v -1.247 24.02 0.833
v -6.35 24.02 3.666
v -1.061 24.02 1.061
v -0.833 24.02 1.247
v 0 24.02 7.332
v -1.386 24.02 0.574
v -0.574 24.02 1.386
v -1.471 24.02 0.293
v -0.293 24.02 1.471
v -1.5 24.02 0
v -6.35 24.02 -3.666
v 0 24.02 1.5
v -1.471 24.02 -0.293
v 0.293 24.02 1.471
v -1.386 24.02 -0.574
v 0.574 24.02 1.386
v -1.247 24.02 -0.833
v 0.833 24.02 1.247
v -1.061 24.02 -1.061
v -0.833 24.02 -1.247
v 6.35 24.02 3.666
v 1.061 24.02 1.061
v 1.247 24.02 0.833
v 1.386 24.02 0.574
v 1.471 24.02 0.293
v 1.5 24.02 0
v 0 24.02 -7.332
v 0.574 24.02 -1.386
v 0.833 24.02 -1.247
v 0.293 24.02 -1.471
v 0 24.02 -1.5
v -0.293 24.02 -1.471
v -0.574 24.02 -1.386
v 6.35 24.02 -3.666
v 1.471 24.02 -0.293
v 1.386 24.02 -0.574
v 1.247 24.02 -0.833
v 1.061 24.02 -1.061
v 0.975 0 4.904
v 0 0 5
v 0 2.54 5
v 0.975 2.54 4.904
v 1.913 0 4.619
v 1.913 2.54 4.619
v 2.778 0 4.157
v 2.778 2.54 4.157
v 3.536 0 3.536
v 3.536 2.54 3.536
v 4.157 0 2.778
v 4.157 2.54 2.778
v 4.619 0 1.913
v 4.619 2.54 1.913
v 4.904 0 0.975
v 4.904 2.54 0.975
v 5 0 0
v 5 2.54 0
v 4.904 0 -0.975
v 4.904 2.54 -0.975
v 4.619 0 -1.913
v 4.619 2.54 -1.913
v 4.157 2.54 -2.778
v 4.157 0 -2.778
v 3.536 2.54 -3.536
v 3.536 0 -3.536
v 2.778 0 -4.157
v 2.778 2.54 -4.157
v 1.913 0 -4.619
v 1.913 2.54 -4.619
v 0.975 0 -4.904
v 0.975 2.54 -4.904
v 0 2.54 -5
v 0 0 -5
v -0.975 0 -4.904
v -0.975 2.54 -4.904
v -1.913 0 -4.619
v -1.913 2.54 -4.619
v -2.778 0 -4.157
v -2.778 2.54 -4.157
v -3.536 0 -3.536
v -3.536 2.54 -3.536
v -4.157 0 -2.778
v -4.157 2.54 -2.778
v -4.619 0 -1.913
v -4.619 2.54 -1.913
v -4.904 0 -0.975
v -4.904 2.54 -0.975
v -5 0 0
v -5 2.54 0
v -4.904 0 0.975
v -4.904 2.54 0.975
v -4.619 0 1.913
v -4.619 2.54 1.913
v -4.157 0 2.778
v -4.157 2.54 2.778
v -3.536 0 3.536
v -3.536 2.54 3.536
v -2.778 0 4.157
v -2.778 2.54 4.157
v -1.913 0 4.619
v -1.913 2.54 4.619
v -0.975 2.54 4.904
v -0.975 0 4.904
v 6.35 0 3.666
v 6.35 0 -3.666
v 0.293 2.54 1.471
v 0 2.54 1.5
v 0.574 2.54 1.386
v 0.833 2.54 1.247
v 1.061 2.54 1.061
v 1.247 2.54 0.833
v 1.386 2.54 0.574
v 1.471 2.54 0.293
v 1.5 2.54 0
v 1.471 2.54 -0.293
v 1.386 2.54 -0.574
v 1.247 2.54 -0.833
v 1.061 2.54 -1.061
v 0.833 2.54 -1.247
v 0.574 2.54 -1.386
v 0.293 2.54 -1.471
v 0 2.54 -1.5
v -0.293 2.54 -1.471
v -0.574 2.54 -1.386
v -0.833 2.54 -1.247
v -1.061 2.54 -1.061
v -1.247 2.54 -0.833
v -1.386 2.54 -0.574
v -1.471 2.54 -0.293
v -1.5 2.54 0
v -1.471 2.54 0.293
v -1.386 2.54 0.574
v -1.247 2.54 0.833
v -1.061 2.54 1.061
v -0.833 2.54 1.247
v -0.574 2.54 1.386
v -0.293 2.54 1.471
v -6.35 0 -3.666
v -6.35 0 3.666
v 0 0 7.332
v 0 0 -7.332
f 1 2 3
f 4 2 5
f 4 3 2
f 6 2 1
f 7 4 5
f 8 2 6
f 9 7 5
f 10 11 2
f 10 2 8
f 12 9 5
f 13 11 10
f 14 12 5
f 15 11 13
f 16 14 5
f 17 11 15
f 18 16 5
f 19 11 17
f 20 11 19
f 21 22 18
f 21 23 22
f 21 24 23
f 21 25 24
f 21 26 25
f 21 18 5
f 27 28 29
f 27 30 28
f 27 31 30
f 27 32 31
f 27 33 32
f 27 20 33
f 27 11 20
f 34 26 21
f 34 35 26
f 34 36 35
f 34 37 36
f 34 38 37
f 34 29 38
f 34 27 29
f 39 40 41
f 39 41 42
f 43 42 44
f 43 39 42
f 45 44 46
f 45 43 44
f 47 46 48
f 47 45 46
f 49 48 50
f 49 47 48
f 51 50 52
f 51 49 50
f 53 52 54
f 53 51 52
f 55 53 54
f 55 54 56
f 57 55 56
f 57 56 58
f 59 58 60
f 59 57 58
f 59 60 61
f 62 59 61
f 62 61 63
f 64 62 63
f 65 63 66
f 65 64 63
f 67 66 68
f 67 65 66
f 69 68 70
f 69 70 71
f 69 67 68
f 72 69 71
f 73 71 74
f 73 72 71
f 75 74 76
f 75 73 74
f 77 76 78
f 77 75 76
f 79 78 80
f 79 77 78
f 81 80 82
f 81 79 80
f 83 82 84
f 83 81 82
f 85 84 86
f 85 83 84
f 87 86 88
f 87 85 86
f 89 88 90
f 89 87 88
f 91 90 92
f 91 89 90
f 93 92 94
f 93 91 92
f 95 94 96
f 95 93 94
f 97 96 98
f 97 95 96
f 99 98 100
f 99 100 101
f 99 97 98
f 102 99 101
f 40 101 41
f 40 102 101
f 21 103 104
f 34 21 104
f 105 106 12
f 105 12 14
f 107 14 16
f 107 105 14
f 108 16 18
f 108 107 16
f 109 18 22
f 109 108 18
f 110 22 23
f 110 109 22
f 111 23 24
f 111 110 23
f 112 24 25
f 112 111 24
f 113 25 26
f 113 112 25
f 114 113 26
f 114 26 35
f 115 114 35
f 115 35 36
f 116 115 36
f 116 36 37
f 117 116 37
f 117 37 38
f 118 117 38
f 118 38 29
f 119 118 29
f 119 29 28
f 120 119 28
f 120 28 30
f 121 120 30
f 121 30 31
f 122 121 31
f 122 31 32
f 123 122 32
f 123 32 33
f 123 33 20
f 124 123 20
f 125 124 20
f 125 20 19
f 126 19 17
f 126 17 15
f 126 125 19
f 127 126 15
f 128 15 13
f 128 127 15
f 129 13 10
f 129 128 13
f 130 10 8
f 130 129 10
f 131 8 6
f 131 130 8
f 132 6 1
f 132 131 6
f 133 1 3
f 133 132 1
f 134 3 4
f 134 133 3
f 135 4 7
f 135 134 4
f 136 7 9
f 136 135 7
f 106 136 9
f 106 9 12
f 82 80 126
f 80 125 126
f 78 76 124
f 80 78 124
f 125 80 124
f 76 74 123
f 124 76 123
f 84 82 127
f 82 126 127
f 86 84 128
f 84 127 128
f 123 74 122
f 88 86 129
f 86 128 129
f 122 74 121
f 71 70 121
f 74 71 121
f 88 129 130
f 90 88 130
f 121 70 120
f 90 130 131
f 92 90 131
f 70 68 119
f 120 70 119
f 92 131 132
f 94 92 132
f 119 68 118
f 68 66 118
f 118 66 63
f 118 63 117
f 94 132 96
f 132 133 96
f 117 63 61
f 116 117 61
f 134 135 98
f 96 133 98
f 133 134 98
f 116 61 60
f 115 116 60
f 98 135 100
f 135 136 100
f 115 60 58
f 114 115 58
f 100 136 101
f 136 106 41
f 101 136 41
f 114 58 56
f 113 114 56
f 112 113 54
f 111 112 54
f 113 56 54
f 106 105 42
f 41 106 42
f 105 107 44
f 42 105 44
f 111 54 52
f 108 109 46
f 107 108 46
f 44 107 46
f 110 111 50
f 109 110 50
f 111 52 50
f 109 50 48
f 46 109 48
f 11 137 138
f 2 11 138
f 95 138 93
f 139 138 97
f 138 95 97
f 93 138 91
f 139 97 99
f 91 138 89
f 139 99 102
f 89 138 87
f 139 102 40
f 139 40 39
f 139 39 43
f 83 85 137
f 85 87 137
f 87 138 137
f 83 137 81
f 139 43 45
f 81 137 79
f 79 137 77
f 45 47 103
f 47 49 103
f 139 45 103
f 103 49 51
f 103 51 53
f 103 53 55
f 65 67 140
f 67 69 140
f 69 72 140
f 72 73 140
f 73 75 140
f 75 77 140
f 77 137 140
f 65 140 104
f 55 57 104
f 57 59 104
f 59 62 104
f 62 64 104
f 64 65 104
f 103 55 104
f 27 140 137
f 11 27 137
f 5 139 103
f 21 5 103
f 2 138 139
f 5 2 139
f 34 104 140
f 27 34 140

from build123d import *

# Parameters (mm, degrees)
SKETCH1_R           = 1.5
BOSS_EXTRUDE1_DEPTH = 24.0204498
SKETCH2_R           = 5
CUT_EXTRUDE1_DEPTH  = 2.54


with BuildPart() as part:
    # Sketch1 → Boss-Extrude1 (new body)
    with BuildSketch(Plane(origin=(0, 0, 0), x_dir=(1, 0, 0), z_dir=(0, 1, 0))):
        Polygon((0, 7.332348419), (-6.35, 3.666174209), (-6.35, -3.666174209), (0, -7.332348419), (6.35, -3.666174209), (6.35, 3.666174209), align=None)
        with Locations(Location((0, 0, 0), (0, 0, 270))):
            Circle(SKETCH1_R, mode=Mode.SUBTRACT)
    extrude(amount=BOSS_EXTRUDE1_DEPTH)

    # Sketch2 → Cut-Extrude1 (cut)
    with BuildSketch(Plane(origin=(0, 0, 0), x_dir=(1, 0, 0), z_dir=(0, 1, 0))):
        with Locations(Location((0, 0, 0), (0, 0, 270))):
            Circle(SKETCH2_R)
    extrude(amount=CUT_EXTRUDE1_DEPTH, mode=Mode.SUBTRACT)


solid = part.part
